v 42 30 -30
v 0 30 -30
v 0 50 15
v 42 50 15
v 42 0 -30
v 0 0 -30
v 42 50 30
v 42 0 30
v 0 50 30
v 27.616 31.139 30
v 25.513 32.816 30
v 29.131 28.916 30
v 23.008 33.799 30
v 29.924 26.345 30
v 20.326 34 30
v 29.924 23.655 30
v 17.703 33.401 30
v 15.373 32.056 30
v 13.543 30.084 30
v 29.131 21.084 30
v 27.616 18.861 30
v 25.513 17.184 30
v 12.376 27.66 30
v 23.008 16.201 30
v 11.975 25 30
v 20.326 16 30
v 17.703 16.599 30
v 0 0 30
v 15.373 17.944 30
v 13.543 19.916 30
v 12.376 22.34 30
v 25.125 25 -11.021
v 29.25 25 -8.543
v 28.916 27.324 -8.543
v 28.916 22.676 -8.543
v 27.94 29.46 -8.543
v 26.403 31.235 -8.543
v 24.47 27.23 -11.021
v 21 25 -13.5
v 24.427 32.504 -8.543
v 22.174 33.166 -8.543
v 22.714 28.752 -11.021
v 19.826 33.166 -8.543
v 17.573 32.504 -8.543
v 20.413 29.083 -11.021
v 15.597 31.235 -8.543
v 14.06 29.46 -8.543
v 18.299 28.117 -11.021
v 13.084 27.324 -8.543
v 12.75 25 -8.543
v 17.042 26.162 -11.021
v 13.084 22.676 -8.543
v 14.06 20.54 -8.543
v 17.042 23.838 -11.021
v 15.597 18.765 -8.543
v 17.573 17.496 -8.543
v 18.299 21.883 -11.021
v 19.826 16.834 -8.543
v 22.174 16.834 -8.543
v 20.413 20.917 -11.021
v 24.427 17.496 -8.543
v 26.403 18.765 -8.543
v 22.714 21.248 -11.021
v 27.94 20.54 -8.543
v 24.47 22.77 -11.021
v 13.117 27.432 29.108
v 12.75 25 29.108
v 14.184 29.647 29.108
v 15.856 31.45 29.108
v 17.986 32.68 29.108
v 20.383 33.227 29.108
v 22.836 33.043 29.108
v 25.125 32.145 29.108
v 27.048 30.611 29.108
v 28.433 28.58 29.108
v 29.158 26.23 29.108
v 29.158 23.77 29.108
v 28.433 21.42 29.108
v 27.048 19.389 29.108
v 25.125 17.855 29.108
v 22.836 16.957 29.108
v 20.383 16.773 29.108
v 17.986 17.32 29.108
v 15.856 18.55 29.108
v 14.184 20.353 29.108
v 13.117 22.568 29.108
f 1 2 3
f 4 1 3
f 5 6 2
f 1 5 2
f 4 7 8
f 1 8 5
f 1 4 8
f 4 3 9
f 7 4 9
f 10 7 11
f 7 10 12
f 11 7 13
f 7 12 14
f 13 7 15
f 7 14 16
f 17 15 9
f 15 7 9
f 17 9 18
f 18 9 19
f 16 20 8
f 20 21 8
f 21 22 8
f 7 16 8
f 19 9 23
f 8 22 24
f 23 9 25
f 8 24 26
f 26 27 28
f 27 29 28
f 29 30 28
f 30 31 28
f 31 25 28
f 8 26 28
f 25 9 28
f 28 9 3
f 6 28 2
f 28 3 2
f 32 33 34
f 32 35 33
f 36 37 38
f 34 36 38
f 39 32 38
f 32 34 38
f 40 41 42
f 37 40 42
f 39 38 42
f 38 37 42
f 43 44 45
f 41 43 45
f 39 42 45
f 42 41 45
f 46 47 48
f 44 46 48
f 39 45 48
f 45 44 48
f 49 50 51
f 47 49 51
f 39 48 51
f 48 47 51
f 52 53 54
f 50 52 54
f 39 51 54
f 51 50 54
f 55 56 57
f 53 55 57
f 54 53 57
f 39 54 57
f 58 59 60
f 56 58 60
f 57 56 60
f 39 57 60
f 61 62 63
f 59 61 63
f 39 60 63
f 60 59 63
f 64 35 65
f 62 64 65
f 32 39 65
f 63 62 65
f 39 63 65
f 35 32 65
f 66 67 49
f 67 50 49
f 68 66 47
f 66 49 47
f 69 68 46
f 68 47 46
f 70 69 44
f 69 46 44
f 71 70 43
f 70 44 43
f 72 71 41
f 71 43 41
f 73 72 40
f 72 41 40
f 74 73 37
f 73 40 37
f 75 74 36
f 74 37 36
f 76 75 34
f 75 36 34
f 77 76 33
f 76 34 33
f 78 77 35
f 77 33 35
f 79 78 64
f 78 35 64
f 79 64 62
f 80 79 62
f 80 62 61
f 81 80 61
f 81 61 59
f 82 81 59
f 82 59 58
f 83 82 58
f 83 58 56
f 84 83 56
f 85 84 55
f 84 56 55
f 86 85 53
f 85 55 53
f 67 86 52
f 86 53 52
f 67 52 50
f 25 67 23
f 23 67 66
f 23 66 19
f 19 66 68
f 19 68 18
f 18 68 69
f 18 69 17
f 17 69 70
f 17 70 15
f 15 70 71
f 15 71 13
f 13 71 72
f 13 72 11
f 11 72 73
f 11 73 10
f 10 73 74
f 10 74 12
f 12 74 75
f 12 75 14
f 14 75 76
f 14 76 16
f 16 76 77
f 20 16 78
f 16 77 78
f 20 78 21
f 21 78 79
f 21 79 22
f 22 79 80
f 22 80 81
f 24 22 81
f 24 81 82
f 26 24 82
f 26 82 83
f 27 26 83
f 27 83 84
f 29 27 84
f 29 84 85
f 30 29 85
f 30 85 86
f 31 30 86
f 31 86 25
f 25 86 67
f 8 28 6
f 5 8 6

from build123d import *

# Parameters (mm, degrees)
ESTRUSIONE_ESTRUSIONE1_DEPTH         = 42
FORO_FILETTATO_M18X1_5_1_D           = 16.5
FORO_FILETTATO_M18X1_5_1_DEPTH       = 38.542899893
FORO_FILETTATO_M18X1_5_1_CSINK_D     = 18.05
FORO_FILETTATO_M18X1_5_1_CSINK_ANGLE = 82
FORO_FILETTATO_M18X1_5_1_TIP         = 4.957100107


with BuildPart() as part:
    # Schizzo1 → Estrusione-Estrusione1 (new body)
    with BuildSketch(Plane(origin=(0, 0, 0), x_dir=(0, 0, -1), z_dir=(1, 0, 0))):
        Polygon((-30, 50), (-30, 0), (30, 0), (30, 30), (-15, 50), align=None)
    extrude(amount=ESTRUSIONE_ESTRUSIONE1_DEPTH)

    # Foro filettato M18x1.5-1
    with Locations(Plane.XY.offset(30)):
        with Locations((21, 25)):
            CounterSinkHole(FORO_FILETTATO_M18X1_5_1_D / 2, FORO_FILETTATO_M18X1_5_1_CSINK_D / 2, depth=FORO_FILETTATO_M18X1_5_1_DEPTH, counter_sink_angle=FORO_FILETTATO_M18X1_5_1_CSINK_ANGLE)
            with Locations((0, 0, -(FORO_FILETTATO_M18X1_5_1_DEPTH + FORO_FILETTATO_M18X1_5_1_TIP / 2))):  # 118° drill point
                Cone(0, FORO_FILETTATO_M18X1_5_1_D / 2, FORO_FILETTATO_M18X1_5_1_TIP, mode=Mode.SUBTRACT)


solid = part.part
